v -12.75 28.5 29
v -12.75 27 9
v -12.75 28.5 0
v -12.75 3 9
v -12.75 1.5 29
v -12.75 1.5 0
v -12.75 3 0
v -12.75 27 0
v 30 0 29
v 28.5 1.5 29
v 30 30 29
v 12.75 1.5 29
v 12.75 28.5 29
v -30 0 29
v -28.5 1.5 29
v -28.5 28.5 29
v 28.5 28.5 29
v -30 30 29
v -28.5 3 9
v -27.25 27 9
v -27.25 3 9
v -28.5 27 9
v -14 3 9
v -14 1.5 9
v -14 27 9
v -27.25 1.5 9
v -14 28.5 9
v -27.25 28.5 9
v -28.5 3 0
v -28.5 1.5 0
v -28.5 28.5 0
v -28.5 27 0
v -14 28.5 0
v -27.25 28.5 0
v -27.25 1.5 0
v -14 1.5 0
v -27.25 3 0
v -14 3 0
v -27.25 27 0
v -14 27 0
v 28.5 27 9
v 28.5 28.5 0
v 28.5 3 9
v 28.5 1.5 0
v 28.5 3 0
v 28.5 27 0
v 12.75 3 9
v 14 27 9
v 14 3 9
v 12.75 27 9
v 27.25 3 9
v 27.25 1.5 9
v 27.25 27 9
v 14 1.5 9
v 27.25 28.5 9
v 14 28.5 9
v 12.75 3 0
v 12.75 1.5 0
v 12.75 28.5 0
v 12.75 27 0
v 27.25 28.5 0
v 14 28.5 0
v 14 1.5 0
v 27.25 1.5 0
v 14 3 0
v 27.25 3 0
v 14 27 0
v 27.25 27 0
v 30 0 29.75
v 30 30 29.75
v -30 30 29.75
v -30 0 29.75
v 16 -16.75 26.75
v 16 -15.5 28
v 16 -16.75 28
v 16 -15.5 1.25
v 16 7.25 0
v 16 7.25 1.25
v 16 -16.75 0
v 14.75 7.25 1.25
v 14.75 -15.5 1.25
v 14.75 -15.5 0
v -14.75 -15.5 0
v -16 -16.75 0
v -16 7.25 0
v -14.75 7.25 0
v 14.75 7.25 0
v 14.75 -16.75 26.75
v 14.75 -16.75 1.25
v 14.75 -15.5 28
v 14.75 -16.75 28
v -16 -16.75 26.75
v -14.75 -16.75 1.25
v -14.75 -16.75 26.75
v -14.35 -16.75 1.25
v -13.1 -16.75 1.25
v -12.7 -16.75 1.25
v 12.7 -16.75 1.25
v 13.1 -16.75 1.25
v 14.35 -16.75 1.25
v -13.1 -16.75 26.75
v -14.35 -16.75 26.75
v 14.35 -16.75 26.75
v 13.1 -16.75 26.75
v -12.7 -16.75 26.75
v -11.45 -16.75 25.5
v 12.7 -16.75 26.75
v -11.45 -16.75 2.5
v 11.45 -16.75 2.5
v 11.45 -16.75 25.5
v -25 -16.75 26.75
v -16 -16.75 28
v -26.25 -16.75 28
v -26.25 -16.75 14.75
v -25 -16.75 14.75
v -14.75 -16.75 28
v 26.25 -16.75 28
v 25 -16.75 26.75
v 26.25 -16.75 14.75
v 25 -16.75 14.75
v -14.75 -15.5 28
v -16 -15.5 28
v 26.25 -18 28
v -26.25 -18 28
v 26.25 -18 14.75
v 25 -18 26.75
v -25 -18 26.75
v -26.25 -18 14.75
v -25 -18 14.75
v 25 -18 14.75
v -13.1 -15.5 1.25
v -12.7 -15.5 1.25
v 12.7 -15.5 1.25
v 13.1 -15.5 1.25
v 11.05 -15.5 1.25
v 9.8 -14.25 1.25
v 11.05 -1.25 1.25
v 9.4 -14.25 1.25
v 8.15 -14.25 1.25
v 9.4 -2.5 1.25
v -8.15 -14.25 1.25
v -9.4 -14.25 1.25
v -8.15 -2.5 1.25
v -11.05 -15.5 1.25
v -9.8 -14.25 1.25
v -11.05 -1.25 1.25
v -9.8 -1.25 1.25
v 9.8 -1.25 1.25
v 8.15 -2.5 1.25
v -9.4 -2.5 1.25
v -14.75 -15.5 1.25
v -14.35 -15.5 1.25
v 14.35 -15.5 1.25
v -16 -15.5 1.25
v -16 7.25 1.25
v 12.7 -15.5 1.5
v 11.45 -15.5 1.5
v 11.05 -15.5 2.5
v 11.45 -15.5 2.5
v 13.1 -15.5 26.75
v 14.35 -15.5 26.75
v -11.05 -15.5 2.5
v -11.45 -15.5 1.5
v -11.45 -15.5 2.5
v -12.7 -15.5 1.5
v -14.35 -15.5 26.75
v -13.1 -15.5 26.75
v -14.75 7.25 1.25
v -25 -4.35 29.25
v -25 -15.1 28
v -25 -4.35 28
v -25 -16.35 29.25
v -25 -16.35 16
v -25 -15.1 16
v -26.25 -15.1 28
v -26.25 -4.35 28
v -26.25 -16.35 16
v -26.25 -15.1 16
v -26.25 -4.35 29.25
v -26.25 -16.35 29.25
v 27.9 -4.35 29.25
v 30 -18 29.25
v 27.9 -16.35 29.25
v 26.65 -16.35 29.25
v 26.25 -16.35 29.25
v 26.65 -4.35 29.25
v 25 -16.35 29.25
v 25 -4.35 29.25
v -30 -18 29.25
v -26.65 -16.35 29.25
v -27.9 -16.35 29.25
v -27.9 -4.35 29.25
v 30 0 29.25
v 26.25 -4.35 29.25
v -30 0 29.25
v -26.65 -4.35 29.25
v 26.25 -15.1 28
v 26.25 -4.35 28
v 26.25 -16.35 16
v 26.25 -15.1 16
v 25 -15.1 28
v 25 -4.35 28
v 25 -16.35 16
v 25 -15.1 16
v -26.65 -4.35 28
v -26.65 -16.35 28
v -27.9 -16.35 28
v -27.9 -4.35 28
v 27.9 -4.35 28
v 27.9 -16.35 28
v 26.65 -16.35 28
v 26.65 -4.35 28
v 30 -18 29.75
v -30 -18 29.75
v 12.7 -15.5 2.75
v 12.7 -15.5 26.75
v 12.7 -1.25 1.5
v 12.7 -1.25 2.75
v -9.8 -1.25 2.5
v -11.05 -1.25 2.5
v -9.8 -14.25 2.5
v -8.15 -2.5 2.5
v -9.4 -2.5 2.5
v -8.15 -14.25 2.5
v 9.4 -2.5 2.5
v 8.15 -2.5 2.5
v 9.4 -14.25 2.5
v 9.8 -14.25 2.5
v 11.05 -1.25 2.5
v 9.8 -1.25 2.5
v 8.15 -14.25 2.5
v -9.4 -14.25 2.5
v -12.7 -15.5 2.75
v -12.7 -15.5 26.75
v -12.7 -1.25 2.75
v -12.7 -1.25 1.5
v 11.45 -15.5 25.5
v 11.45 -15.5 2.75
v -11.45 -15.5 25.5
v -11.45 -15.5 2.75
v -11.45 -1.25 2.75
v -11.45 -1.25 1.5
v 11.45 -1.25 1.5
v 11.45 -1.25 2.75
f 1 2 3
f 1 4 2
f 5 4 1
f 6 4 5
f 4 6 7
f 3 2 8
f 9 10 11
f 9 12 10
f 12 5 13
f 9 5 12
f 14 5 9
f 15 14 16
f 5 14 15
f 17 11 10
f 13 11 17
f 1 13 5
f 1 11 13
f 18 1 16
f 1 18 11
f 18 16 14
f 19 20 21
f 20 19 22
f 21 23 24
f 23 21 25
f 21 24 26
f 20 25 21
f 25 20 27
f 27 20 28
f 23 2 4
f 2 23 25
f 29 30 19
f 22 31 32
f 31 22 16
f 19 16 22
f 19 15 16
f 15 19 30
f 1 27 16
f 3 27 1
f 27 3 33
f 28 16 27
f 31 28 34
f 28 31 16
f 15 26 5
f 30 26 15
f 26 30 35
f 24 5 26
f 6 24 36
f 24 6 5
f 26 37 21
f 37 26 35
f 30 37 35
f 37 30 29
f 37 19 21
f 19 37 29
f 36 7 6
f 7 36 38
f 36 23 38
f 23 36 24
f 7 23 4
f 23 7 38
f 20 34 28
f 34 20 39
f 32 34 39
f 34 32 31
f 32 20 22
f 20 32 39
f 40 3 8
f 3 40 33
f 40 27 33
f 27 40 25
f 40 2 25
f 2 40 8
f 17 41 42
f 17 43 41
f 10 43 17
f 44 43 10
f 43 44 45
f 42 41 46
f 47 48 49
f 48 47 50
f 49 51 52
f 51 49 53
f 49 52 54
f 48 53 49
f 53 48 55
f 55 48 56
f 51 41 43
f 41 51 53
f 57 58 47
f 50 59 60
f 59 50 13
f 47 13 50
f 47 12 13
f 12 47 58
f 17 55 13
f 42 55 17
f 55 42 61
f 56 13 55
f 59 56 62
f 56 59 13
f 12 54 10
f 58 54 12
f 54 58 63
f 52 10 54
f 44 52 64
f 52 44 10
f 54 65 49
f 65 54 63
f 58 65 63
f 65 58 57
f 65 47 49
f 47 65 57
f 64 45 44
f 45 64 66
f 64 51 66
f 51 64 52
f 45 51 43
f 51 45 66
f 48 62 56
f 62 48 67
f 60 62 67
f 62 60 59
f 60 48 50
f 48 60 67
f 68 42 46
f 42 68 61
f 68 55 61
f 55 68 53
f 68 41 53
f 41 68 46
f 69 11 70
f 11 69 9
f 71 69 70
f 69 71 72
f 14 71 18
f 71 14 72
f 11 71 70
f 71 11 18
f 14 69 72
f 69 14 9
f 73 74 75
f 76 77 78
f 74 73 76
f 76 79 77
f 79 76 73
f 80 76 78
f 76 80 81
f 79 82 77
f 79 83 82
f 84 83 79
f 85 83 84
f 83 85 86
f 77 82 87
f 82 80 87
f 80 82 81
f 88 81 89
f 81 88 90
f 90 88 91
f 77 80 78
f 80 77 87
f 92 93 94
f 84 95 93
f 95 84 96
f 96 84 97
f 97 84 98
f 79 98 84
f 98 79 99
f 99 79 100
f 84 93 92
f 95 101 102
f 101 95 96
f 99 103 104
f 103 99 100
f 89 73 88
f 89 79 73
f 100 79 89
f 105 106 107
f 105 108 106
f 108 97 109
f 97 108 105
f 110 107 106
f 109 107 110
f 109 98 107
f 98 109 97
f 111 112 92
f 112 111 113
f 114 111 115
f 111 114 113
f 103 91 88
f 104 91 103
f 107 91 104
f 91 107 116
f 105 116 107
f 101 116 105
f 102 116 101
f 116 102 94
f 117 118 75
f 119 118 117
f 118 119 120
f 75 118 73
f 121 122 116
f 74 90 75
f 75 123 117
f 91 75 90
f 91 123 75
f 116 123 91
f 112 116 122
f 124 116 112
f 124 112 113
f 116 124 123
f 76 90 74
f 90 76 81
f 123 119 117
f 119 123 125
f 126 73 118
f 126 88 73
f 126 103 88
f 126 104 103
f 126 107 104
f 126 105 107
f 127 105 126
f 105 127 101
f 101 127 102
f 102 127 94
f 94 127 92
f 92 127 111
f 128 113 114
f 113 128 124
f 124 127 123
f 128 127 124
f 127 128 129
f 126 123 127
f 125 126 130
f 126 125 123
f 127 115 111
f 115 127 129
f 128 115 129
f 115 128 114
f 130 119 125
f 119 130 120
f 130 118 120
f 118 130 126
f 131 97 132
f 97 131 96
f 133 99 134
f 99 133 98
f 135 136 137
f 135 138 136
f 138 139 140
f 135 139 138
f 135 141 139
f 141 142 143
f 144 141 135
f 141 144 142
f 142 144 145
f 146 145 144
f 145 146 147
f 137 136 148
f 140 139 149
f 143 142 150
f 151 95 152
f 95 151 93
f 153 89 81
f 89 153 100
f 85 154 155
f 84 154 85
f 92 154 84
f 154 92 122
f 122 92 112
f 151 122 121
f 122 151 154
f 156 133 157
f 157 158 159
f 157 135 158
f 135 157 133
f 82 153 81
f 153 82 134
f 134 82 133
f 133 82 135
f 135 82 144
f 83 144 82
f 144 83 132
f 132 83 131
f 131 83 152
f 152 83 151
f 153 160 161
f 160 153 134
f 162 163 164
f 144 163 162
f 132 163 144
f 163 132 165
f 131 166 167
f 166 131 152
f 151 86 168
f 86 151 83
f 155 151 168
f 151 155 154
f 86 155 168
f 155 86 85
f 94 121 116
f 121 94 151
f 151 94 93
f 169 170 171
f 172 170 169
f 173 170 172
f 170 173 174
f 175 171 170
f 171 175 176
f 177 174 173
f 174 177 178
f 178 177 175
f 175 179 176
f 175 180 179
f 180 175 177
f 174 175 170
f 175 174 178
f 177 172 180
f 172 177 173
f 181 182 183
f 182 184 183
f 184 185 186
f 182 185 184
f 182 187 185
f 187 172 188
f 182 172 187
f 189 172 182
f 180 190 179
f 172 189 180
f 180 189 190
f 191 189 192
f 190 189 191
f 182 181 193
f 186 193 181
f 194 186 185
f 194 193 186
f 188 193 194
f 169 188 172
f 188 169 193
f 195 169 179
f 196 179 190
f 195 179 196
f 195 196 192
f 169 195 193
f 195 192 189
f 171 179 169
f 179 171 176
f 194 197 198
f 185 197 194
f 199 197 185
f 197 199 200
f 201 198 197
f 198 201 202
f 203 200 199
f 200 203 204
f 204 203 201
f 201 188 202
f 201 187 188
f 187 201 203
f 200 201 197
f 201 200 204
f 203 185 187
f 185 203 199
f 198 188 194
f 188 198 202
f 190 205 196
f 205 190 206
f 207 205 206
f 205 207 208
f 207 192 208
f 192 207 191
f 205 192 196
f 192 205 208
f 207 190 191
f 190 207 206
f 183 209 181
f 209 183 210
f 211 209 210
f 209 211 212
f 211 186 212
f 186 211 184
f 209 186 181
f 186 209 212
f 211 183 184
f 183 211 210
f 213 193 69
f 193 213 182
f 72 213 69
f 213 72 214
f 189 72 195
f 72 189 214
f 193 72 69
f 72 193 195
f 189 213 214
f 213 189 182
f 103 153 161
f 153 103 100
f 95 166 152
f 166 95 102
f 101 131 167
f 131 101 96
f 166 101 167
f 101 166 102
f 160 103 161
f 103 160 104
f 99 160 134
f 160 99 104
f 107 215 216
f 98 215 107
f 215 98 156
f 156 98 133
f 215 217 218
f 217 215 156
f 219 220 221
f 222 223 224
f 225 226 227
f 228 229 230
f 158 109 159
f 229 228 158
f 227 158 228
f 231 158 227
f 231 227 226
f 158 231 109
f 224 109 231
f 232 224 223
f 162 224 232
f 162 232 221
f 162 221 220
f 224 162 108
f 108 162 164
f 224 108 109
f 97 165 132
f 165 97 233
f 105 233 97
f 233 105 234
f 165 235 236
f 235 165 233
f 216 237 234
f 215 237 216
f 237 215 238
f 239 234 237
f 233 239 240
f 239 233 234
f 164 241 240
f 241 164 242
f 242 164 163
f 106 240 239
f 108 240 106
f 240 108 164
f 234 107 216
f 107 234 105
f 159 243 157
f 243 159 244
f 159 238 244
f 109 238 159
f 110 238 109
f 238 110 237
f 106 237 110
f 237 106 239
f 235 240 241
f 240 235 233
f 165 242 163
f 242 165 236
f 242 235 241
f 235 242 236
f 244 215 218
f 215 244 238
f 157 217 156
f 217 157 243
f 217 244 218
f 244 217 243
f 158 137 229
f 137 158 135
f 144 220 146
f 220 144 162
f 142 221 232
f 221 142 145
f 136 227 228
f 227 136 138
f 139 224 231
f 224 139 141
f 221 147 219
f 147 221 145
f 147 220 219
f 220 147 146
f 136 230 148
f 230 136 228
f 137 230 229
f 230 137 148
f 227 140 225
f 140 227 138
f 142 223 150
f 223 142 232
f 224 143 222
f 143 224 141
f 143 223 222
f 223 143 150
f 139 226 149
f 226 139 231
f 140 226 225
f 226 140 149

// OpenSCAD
// file: dimensions.scad
// Dimensions in inches, the way it was made

top_width     = 60;
top_depth     = 30;
top_thickness = 0.75;
top_overhang  = 1.5;

leg_length = 29;
leg_width  = 1.25;
leg_depth  = 1.5;

plinth_width  = 15.75;
plinth_depth  = 27;
plinth_height = 20;

strut_size  = 1.25;             /* actually 30mm */

rear_box_depth = 18;
rear_frame_depth = rear_box_depth - strut_size;

full_extension = 3.0 / 4.0;

cover_frame_width = top_width - strut_size * 6;
cover_lift_depth = 12;
cover_lift_max = cover_lift_depth * full_extension;

cover_thickness = 0.5;

base_height = 28;
base_width  = 32;               /* will need adjusting */
foot_length = 24;

slider_thickness = 0.4;         /* measure when I get some */

cover_slide_max = rear_box_depth * full_extension;

carrier_width = base_width - (strut_size + slider_thickness) * 2;
carrier_height = base_height - strut_size;
carrier_max = carrier_height * full_extension;

monitor_bank_depth = 24;        /* top of desk to top of monitor */

riser_width = carrier_width - (strut_size + slider_thickness) * 2;
riser_height = carrier_height - strut_size;
riser_depth = rear_frame_depth - strut_size;
riser_max = riser_height * full_extension;

fork_width = riser_width  - (strut_size + slider_thickness) * 2;
fork_depth = riser_depth - strut_size;
fork_max = fork_depth * full_extension;

jib_width = fork_width - (strut_size + slider_thickness) * 2;
jib_depth = fork_depth - strut_size;
jib_max = jib_depth * full_extension;
// file: lift.scad
include <dimensions.scad>

module base(cover_h, cover_v, h_position, v_position) {
     translate([-base_width/2, 0, 0]) {
          color("blue")
               union() {
               cube([base_width, strut_size, strut_size]);
               cube([strut_size, foot_length, strut_size]);
               cube([strut_size, strut_size, base_height]);
               translate([base_width-strut_size, 0, 0]) {
                    cube([strut_size, foot_length, strut_size]);
                    cube([strut_size, strut_size, base_height]);
               }
               /* the cover lift supports */
               translate([-(cover_frame_width-base_width)/2, -strut_size, base_height-strut_size]) {
                    cube([cover_frame_width, strut_size, strut_size]);
                    translate([0, 0, -cover_lift_depth ]) cube([strut_size, strut_size, cover_lift_depth]);
                    translate([cover_frame_width-strut_size, 0, -cover_lift_depth ]) cube([strut_size, strut_size, cover_lift_depth]);
               }
          }
     }
     cover_lift(cover_h, cover_v);
     carrier(h_position, v_position);
}

module cover_lift(cover_h, cover_v) {
     translate([-cover_frame_width/2, slider_thickness, cover_v * cover_lift_max + base_height]) {
          color("cyan") {
               translate([0, 0, -cover_lift_depth ]) cube([strut_size, strut_size, cover_lift_depth]);
               translate([0, 0, 0]) cube([strut_size, cover_lift_depth, strut_size]);
               translate([cover_frame_width-strut_size, 0, -cover_lift_depth ]) cube([strut_size, strut_size, cover_lift_depth]);
               translate([cover_frame_width-strut_size, 0, 0]) cube([strut_size, cover_lift_depth, strut_size]);
          }
          cover_carrier(cover_h);
     }
}

module cover_carrier(cover_h) {
     translate([-(slider_thickness + strut_size), cover_h * cover_slide_max, 0]) cube([strut_size, cover_lift_depth, strut_size]);
     translate([cover_frame_width + slider_thickness, cover_h * cover_slide_max, 0]) cube([strut_size, cover_lift_depth, strut_size]);
     translate([(cover_frame_width - top_width)/2, cover_h * cover_slide_max - strut_size - slider_thickness, 0]) cover();
}

module cover() {
     translate([0, 0, strut_size]) cube([top_width, rear_box_depth, cover_thickness]);
}

module carrier(h_position, v_position) {
     translate([-carrier_width/2, 0, v_position*carrier_max/2]) {
          color("yellow")
               union() {
               cube([carrier_width, strut_size, strut_size]);
               cube([strut_size, strut_size, carrier_height]);
               translate([carrier_width-strut_size, 0, 0]) cube([strut_size, strut_size, carrier_height]);
          }
     }
     riser(h_position, v_position);
}

module riser(h_position, v_position) {
     translate([-riser_width/2, 0, strut_size + v_position*riser_max]) {
          color("green") union() {
               cube([riser_width, strut_size, strut_size]);
               cube([strut_size, strut_size, riser_height]);
               translate([riser_width-strut_size, 0, 0]) cube([strut_size, strut_size, riser_height]);
               translate([0, 0, riser_height-strut_size]) cube([riser_width, strut_size, strut_size]);
               translate([0, 0, riser_height-strut_size-monitor_bank_depth]) cube([strut_size, riser_depth, strut_size]);
               translate([riser_width-strut_size, 0, riser_height-strut_size-monitor_bank_depth]) cube([strut_size, riser_depth, strut_size]);
          }
     }
     translate([0, 0, strut_size + v_position*riser_max]) fork(h_position);
}

module fork(h_position) {
     translate([-fork_width/2, h_position*fork_max/2+strut_size, 0]) {
          cube([fork_width, strut_size, strut_size]);
          cube([strut_size, fork_depth, strut_size]);
          translate([fork_width-strut_size, 0, 0]) cube([strut_size, fork_depth, strut_size]);
     }
     jib(h_position);
}

module jib(h_position) {
     color("red")
          translate([-jib_width/2, h_position*jib_max+strut_size, 0]) {
          cube([jib_width, strut_size, strut_size]);
          cube([strut_size, jib_depth, strut_size]);
          translate([jib_width-strut_size, 0, 0]) cube([strut_size, jib_depth, strut_size]);
     }
}
// file: desk.scad
include <dimensions.scad>

module leg() {
       cube([leg_width, leg_depth, leg_length]);
}

module plinth() {
     union() {
          translate ([0, 0, leg_length-plinth_height]) cube([plinth_width, plinth_depth, plinth_height]);
          leg();
          translate([plinth_width - leg_width, 0, 0]) leg();
          translate([0, plinth_depth - leg_depth, 0]) leg();
          translate([plinth_width - leg_width, plinth_depth - leg_depth, 0]) leg();
     }
}

module desk() {
     half_width = top_width / 2;
     translate([top_overhang-half_width, top_overhang, 0]) plinth();
     translate([half_width-top_overhang-plinth_width, top_overhang, 0]) plinth();
     translate([-half_width, 0, leg_length]) cube([top_width, top_depth, top_thickness]);
}
// main file
include <desk.scad>
include <lift.scad>

color("brown") desk();
translate([0, -rear_frame_depth, 0]) base(0, 0, 0, 0);
